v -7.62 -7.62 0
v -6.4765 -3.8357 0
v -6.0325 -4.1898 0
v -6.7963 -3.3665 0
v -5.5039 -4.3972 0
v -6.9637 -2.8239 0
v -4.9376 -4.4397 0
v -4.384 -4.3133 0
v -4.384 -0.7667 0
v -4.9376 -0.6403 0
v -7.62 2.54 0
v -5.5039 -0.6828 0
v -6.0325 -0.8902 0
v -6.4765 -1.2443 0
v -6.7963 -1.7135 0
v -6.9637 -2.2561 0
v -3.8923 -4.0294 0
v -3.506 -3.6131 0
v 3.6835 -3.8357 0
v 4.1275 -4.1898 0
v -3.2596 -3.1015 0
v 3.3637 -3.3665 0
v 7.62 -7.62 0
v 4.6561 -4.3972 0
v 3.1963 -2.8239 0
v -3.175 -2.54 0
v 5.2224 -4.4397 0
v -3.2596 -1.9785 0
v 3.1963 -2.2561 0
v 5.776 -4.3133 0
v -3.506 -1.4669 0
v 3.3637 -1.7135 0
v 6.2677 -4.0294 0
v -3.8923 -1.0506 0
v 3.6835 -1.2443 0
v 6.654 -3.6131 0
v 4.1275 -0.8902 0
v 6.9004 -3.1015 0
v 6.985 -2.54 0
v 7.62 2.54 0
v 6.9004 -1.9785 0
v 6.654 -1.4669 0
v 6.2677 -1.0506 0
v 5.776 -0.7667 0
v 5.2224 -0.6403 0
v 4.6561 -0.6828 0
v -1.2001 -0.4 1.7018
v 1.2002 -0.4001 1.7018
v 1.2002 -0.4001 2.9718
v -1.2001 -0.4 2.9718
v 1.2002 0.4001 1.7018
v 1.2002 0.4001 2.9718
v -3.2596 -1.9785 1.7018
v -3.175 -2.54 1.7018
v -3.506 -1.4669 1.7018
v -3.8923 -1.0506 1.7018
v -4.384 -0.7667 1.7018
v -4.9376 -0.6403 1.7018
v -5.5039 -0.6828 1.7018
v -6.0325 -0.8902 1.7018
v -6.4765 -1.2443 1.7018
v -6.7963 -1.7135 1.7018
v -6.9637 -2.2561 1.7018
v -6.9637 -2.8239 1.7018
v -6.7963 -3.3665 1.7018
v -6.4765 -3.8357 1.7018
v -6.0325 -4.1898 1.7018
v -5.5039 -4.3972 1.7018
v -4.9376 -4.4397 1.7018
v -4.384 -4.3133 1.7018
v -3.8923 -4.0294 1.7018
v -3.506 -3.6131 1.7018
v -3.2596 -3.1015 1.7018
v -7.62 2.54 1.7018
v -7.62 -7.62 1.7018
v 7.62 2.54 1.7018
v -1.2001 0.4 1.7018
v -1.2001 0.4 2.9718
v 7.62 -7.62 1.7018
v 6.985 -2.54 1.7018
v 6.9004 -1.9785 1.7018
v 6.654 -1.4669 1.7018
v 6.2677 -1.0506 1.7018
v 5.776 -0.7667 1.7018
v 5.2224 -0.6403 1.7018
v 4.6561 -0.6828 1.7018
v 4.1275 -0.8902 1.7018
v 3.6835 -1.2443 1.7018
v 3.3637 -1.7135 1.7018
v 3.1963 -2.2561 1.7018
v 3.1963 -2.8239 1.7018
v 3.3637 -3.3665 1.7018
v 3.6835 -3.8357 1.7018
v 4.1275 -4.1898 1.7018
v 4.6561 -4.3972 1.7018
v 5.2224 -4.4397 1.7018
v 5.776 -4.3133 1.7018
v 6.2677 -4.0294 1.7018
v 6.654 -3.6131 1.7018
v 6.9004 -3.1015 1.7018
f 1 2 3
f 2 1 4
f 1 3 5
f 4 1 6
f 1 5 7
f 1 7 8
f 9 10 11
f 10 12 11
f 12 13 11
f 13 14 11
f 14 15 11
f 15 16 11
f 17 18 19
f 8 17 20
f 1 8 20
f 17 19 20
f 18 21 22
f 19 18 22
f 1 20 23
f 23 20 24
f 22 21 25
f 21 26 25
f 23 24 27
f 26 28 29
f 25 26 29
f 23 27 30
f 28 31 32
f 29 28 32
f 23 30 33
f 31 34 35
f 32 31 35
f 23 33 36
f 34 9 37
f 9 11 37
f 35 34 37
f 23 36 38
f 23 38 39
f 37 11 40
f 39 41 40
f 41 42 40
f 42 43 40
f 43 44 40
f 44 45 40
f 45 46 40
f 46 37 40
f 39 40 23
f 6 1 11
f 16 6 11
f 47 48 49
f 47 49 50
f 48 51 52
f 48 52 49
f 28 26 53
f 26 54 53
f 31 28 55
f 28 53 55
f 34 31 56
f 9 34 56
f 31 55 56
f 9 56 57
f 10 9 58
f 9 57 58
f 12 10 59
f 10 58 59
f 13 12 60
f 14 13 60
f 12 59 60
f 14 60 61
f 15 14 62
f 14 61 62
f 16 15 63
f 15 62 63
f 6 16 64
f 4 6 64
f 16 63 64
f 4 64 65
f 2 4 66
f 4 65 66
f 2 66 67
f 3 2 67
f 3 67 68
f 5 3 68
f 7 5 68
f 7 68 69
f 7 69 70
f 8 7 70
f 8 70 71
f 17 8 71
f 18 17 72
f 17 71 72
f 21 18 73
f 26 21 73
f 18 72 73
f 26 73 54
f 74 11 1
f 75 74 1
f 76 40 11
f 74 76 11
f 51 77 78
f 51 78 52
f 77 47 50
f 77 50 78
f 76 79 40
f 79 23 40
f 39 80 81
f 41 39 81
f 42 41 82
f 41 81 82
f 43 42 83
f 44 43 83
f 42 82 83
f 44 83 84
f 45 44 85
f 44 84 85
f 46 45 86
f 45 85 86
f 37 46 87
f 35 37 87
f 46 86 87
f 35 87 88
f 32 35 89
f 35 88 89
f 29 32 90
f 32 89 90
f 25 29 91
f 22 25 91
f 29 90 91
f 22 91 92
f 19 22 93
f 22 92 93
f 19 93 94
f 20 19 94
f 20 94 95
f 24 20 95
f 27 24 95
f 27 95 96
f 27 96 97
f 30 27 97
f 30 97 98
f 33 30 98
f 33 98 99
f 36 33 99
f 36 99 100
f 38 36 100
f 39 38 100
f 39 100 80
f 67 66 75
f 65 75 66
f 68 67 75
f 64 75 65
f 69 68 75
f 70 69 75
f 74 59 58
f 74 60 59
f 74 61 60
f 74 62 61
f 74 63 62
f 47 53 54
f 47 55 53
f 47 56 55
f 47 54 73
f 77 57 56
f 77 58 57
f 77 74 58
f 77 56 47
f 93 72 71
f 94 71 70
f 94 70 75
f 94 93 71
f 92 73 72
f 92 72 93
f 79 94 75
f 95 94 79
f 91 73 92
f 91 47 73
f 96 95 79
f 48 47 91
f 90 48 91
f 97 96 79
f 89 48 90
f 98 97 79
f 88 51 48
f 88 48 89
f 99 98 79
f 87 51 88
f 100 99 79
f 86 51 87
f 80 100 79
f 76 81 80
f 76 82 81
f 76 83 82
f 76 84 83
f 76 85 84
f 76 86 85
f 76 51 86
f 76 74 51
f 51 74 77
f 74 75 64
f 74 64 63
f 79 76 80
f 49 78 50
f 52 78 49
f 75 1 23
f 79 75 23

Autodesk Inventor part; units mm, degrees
ref_plane "YZ Plane" through (0, 0, 0) normal (1, 0, 0) x (0, 1, 0)
ref_plane "XZ Plane" through (0, 0, 0) normal (0, 1, 0) x (-1, 0, 0)
ref_plane "XY Plane" through (0, 0, 0) normal (0, 0, 1) x (1, 0, 0)
sketch "Sketch1" plane through (0, 0, 0) normal (0, 0, 1) x (1, 0, 0)
  line L0 (-7.62, -7.62) -> (7.62, -7.62)
  line L1 (7.62, -7.62) -> (7.62, 2.54)
  line L2 (7.62, 2.54) -> (-7.62, 2.54)
  line L3 (-7.62, 2.54) -> (-7.62, -7.62)
  line L4 (-10.668, 0) -> (10.668, 0) construction
  line L5 (0, -9.652) -> (0, 4.572) construction
  point P0 (0, 0)
  dimension "d0" = 10.16
  dimension "d1" = 15.24
  dimension "d2" = 2.54
extrude "Extrusion1" add sketch "Sketch1" along normal blind 1.7018
sketch "Sketch2" plane through (0, 0, 1.7018) normal (0, 0, 1) x (1, 0, 0)
  line L0 (-7.62, -7.62) -> (-7.62, 2.54) projected
  line L1 (7.62, -7.62) -> (-7.62, -7.62) projected
  line L2 (7.62, 2.54) -> (7.62, -7.62) projected
  line L3 (-7.62, 2.54) -> (7.62, 2.54) projected
  line L4 (-10.668, 0) -> (10.668, 0) construction
  line L5 (0, -9.652) -> (0, 4.572) construction
  line L6 (-7.62, -2.54) -> (7.62, -2.54) construction
  circle A0 centre (-5.08, -2.54) radius 1.905
  circle A1 centre (5.08, -2.54) radius 1.905
  point P0 (0, 0)
  dimension "d5" = 10.16
  dimension "d6" = 3.81
extrude "Extrusion2" cut sketch "Sketch2" against normal through all contours A0 | A1
sketch "Sketch3" plane through (0, 0, 1.7018) normal (0, 0, 1) x (1, 0, 0)
  line L0 (-10.668, 0) -> (10.668, 0) construction
  line L1 (0, -9.652) -> (0, 4.572) construction
  line L2 (-1.2001, 0.4) -> (1.2002, 0.4001)
  line L3 (1.2002, 0.4001) -> (1.2002, -0.4001)
  line L4 (1.2002, -0.4001) -> (-1.2001, -0.4)
  line L5 (-1.2001, -0.4) -> (-1.2001, 0.4)
  point P0 (0, 0)
  dimension "d9" = 0.8001
  dimension "d10" = 2.4003
extrude "Extrusion3" add sketch "Sketch3" along normal blind 1.27
sketch "Sketch4" plane through (0, 0, 0) normal (0, 0, -1) x (-1, 0, 0)
  circle A0 centre (2.54, 0.1778) radius 0.635 projected
  circle A1 centre (0, 0.1778) radius 0.635 projected
  circle A2 centre (-2.54, 0.1778) radius 0.635 projected
  point P0 (0, 0)
properties part number "J002609"
